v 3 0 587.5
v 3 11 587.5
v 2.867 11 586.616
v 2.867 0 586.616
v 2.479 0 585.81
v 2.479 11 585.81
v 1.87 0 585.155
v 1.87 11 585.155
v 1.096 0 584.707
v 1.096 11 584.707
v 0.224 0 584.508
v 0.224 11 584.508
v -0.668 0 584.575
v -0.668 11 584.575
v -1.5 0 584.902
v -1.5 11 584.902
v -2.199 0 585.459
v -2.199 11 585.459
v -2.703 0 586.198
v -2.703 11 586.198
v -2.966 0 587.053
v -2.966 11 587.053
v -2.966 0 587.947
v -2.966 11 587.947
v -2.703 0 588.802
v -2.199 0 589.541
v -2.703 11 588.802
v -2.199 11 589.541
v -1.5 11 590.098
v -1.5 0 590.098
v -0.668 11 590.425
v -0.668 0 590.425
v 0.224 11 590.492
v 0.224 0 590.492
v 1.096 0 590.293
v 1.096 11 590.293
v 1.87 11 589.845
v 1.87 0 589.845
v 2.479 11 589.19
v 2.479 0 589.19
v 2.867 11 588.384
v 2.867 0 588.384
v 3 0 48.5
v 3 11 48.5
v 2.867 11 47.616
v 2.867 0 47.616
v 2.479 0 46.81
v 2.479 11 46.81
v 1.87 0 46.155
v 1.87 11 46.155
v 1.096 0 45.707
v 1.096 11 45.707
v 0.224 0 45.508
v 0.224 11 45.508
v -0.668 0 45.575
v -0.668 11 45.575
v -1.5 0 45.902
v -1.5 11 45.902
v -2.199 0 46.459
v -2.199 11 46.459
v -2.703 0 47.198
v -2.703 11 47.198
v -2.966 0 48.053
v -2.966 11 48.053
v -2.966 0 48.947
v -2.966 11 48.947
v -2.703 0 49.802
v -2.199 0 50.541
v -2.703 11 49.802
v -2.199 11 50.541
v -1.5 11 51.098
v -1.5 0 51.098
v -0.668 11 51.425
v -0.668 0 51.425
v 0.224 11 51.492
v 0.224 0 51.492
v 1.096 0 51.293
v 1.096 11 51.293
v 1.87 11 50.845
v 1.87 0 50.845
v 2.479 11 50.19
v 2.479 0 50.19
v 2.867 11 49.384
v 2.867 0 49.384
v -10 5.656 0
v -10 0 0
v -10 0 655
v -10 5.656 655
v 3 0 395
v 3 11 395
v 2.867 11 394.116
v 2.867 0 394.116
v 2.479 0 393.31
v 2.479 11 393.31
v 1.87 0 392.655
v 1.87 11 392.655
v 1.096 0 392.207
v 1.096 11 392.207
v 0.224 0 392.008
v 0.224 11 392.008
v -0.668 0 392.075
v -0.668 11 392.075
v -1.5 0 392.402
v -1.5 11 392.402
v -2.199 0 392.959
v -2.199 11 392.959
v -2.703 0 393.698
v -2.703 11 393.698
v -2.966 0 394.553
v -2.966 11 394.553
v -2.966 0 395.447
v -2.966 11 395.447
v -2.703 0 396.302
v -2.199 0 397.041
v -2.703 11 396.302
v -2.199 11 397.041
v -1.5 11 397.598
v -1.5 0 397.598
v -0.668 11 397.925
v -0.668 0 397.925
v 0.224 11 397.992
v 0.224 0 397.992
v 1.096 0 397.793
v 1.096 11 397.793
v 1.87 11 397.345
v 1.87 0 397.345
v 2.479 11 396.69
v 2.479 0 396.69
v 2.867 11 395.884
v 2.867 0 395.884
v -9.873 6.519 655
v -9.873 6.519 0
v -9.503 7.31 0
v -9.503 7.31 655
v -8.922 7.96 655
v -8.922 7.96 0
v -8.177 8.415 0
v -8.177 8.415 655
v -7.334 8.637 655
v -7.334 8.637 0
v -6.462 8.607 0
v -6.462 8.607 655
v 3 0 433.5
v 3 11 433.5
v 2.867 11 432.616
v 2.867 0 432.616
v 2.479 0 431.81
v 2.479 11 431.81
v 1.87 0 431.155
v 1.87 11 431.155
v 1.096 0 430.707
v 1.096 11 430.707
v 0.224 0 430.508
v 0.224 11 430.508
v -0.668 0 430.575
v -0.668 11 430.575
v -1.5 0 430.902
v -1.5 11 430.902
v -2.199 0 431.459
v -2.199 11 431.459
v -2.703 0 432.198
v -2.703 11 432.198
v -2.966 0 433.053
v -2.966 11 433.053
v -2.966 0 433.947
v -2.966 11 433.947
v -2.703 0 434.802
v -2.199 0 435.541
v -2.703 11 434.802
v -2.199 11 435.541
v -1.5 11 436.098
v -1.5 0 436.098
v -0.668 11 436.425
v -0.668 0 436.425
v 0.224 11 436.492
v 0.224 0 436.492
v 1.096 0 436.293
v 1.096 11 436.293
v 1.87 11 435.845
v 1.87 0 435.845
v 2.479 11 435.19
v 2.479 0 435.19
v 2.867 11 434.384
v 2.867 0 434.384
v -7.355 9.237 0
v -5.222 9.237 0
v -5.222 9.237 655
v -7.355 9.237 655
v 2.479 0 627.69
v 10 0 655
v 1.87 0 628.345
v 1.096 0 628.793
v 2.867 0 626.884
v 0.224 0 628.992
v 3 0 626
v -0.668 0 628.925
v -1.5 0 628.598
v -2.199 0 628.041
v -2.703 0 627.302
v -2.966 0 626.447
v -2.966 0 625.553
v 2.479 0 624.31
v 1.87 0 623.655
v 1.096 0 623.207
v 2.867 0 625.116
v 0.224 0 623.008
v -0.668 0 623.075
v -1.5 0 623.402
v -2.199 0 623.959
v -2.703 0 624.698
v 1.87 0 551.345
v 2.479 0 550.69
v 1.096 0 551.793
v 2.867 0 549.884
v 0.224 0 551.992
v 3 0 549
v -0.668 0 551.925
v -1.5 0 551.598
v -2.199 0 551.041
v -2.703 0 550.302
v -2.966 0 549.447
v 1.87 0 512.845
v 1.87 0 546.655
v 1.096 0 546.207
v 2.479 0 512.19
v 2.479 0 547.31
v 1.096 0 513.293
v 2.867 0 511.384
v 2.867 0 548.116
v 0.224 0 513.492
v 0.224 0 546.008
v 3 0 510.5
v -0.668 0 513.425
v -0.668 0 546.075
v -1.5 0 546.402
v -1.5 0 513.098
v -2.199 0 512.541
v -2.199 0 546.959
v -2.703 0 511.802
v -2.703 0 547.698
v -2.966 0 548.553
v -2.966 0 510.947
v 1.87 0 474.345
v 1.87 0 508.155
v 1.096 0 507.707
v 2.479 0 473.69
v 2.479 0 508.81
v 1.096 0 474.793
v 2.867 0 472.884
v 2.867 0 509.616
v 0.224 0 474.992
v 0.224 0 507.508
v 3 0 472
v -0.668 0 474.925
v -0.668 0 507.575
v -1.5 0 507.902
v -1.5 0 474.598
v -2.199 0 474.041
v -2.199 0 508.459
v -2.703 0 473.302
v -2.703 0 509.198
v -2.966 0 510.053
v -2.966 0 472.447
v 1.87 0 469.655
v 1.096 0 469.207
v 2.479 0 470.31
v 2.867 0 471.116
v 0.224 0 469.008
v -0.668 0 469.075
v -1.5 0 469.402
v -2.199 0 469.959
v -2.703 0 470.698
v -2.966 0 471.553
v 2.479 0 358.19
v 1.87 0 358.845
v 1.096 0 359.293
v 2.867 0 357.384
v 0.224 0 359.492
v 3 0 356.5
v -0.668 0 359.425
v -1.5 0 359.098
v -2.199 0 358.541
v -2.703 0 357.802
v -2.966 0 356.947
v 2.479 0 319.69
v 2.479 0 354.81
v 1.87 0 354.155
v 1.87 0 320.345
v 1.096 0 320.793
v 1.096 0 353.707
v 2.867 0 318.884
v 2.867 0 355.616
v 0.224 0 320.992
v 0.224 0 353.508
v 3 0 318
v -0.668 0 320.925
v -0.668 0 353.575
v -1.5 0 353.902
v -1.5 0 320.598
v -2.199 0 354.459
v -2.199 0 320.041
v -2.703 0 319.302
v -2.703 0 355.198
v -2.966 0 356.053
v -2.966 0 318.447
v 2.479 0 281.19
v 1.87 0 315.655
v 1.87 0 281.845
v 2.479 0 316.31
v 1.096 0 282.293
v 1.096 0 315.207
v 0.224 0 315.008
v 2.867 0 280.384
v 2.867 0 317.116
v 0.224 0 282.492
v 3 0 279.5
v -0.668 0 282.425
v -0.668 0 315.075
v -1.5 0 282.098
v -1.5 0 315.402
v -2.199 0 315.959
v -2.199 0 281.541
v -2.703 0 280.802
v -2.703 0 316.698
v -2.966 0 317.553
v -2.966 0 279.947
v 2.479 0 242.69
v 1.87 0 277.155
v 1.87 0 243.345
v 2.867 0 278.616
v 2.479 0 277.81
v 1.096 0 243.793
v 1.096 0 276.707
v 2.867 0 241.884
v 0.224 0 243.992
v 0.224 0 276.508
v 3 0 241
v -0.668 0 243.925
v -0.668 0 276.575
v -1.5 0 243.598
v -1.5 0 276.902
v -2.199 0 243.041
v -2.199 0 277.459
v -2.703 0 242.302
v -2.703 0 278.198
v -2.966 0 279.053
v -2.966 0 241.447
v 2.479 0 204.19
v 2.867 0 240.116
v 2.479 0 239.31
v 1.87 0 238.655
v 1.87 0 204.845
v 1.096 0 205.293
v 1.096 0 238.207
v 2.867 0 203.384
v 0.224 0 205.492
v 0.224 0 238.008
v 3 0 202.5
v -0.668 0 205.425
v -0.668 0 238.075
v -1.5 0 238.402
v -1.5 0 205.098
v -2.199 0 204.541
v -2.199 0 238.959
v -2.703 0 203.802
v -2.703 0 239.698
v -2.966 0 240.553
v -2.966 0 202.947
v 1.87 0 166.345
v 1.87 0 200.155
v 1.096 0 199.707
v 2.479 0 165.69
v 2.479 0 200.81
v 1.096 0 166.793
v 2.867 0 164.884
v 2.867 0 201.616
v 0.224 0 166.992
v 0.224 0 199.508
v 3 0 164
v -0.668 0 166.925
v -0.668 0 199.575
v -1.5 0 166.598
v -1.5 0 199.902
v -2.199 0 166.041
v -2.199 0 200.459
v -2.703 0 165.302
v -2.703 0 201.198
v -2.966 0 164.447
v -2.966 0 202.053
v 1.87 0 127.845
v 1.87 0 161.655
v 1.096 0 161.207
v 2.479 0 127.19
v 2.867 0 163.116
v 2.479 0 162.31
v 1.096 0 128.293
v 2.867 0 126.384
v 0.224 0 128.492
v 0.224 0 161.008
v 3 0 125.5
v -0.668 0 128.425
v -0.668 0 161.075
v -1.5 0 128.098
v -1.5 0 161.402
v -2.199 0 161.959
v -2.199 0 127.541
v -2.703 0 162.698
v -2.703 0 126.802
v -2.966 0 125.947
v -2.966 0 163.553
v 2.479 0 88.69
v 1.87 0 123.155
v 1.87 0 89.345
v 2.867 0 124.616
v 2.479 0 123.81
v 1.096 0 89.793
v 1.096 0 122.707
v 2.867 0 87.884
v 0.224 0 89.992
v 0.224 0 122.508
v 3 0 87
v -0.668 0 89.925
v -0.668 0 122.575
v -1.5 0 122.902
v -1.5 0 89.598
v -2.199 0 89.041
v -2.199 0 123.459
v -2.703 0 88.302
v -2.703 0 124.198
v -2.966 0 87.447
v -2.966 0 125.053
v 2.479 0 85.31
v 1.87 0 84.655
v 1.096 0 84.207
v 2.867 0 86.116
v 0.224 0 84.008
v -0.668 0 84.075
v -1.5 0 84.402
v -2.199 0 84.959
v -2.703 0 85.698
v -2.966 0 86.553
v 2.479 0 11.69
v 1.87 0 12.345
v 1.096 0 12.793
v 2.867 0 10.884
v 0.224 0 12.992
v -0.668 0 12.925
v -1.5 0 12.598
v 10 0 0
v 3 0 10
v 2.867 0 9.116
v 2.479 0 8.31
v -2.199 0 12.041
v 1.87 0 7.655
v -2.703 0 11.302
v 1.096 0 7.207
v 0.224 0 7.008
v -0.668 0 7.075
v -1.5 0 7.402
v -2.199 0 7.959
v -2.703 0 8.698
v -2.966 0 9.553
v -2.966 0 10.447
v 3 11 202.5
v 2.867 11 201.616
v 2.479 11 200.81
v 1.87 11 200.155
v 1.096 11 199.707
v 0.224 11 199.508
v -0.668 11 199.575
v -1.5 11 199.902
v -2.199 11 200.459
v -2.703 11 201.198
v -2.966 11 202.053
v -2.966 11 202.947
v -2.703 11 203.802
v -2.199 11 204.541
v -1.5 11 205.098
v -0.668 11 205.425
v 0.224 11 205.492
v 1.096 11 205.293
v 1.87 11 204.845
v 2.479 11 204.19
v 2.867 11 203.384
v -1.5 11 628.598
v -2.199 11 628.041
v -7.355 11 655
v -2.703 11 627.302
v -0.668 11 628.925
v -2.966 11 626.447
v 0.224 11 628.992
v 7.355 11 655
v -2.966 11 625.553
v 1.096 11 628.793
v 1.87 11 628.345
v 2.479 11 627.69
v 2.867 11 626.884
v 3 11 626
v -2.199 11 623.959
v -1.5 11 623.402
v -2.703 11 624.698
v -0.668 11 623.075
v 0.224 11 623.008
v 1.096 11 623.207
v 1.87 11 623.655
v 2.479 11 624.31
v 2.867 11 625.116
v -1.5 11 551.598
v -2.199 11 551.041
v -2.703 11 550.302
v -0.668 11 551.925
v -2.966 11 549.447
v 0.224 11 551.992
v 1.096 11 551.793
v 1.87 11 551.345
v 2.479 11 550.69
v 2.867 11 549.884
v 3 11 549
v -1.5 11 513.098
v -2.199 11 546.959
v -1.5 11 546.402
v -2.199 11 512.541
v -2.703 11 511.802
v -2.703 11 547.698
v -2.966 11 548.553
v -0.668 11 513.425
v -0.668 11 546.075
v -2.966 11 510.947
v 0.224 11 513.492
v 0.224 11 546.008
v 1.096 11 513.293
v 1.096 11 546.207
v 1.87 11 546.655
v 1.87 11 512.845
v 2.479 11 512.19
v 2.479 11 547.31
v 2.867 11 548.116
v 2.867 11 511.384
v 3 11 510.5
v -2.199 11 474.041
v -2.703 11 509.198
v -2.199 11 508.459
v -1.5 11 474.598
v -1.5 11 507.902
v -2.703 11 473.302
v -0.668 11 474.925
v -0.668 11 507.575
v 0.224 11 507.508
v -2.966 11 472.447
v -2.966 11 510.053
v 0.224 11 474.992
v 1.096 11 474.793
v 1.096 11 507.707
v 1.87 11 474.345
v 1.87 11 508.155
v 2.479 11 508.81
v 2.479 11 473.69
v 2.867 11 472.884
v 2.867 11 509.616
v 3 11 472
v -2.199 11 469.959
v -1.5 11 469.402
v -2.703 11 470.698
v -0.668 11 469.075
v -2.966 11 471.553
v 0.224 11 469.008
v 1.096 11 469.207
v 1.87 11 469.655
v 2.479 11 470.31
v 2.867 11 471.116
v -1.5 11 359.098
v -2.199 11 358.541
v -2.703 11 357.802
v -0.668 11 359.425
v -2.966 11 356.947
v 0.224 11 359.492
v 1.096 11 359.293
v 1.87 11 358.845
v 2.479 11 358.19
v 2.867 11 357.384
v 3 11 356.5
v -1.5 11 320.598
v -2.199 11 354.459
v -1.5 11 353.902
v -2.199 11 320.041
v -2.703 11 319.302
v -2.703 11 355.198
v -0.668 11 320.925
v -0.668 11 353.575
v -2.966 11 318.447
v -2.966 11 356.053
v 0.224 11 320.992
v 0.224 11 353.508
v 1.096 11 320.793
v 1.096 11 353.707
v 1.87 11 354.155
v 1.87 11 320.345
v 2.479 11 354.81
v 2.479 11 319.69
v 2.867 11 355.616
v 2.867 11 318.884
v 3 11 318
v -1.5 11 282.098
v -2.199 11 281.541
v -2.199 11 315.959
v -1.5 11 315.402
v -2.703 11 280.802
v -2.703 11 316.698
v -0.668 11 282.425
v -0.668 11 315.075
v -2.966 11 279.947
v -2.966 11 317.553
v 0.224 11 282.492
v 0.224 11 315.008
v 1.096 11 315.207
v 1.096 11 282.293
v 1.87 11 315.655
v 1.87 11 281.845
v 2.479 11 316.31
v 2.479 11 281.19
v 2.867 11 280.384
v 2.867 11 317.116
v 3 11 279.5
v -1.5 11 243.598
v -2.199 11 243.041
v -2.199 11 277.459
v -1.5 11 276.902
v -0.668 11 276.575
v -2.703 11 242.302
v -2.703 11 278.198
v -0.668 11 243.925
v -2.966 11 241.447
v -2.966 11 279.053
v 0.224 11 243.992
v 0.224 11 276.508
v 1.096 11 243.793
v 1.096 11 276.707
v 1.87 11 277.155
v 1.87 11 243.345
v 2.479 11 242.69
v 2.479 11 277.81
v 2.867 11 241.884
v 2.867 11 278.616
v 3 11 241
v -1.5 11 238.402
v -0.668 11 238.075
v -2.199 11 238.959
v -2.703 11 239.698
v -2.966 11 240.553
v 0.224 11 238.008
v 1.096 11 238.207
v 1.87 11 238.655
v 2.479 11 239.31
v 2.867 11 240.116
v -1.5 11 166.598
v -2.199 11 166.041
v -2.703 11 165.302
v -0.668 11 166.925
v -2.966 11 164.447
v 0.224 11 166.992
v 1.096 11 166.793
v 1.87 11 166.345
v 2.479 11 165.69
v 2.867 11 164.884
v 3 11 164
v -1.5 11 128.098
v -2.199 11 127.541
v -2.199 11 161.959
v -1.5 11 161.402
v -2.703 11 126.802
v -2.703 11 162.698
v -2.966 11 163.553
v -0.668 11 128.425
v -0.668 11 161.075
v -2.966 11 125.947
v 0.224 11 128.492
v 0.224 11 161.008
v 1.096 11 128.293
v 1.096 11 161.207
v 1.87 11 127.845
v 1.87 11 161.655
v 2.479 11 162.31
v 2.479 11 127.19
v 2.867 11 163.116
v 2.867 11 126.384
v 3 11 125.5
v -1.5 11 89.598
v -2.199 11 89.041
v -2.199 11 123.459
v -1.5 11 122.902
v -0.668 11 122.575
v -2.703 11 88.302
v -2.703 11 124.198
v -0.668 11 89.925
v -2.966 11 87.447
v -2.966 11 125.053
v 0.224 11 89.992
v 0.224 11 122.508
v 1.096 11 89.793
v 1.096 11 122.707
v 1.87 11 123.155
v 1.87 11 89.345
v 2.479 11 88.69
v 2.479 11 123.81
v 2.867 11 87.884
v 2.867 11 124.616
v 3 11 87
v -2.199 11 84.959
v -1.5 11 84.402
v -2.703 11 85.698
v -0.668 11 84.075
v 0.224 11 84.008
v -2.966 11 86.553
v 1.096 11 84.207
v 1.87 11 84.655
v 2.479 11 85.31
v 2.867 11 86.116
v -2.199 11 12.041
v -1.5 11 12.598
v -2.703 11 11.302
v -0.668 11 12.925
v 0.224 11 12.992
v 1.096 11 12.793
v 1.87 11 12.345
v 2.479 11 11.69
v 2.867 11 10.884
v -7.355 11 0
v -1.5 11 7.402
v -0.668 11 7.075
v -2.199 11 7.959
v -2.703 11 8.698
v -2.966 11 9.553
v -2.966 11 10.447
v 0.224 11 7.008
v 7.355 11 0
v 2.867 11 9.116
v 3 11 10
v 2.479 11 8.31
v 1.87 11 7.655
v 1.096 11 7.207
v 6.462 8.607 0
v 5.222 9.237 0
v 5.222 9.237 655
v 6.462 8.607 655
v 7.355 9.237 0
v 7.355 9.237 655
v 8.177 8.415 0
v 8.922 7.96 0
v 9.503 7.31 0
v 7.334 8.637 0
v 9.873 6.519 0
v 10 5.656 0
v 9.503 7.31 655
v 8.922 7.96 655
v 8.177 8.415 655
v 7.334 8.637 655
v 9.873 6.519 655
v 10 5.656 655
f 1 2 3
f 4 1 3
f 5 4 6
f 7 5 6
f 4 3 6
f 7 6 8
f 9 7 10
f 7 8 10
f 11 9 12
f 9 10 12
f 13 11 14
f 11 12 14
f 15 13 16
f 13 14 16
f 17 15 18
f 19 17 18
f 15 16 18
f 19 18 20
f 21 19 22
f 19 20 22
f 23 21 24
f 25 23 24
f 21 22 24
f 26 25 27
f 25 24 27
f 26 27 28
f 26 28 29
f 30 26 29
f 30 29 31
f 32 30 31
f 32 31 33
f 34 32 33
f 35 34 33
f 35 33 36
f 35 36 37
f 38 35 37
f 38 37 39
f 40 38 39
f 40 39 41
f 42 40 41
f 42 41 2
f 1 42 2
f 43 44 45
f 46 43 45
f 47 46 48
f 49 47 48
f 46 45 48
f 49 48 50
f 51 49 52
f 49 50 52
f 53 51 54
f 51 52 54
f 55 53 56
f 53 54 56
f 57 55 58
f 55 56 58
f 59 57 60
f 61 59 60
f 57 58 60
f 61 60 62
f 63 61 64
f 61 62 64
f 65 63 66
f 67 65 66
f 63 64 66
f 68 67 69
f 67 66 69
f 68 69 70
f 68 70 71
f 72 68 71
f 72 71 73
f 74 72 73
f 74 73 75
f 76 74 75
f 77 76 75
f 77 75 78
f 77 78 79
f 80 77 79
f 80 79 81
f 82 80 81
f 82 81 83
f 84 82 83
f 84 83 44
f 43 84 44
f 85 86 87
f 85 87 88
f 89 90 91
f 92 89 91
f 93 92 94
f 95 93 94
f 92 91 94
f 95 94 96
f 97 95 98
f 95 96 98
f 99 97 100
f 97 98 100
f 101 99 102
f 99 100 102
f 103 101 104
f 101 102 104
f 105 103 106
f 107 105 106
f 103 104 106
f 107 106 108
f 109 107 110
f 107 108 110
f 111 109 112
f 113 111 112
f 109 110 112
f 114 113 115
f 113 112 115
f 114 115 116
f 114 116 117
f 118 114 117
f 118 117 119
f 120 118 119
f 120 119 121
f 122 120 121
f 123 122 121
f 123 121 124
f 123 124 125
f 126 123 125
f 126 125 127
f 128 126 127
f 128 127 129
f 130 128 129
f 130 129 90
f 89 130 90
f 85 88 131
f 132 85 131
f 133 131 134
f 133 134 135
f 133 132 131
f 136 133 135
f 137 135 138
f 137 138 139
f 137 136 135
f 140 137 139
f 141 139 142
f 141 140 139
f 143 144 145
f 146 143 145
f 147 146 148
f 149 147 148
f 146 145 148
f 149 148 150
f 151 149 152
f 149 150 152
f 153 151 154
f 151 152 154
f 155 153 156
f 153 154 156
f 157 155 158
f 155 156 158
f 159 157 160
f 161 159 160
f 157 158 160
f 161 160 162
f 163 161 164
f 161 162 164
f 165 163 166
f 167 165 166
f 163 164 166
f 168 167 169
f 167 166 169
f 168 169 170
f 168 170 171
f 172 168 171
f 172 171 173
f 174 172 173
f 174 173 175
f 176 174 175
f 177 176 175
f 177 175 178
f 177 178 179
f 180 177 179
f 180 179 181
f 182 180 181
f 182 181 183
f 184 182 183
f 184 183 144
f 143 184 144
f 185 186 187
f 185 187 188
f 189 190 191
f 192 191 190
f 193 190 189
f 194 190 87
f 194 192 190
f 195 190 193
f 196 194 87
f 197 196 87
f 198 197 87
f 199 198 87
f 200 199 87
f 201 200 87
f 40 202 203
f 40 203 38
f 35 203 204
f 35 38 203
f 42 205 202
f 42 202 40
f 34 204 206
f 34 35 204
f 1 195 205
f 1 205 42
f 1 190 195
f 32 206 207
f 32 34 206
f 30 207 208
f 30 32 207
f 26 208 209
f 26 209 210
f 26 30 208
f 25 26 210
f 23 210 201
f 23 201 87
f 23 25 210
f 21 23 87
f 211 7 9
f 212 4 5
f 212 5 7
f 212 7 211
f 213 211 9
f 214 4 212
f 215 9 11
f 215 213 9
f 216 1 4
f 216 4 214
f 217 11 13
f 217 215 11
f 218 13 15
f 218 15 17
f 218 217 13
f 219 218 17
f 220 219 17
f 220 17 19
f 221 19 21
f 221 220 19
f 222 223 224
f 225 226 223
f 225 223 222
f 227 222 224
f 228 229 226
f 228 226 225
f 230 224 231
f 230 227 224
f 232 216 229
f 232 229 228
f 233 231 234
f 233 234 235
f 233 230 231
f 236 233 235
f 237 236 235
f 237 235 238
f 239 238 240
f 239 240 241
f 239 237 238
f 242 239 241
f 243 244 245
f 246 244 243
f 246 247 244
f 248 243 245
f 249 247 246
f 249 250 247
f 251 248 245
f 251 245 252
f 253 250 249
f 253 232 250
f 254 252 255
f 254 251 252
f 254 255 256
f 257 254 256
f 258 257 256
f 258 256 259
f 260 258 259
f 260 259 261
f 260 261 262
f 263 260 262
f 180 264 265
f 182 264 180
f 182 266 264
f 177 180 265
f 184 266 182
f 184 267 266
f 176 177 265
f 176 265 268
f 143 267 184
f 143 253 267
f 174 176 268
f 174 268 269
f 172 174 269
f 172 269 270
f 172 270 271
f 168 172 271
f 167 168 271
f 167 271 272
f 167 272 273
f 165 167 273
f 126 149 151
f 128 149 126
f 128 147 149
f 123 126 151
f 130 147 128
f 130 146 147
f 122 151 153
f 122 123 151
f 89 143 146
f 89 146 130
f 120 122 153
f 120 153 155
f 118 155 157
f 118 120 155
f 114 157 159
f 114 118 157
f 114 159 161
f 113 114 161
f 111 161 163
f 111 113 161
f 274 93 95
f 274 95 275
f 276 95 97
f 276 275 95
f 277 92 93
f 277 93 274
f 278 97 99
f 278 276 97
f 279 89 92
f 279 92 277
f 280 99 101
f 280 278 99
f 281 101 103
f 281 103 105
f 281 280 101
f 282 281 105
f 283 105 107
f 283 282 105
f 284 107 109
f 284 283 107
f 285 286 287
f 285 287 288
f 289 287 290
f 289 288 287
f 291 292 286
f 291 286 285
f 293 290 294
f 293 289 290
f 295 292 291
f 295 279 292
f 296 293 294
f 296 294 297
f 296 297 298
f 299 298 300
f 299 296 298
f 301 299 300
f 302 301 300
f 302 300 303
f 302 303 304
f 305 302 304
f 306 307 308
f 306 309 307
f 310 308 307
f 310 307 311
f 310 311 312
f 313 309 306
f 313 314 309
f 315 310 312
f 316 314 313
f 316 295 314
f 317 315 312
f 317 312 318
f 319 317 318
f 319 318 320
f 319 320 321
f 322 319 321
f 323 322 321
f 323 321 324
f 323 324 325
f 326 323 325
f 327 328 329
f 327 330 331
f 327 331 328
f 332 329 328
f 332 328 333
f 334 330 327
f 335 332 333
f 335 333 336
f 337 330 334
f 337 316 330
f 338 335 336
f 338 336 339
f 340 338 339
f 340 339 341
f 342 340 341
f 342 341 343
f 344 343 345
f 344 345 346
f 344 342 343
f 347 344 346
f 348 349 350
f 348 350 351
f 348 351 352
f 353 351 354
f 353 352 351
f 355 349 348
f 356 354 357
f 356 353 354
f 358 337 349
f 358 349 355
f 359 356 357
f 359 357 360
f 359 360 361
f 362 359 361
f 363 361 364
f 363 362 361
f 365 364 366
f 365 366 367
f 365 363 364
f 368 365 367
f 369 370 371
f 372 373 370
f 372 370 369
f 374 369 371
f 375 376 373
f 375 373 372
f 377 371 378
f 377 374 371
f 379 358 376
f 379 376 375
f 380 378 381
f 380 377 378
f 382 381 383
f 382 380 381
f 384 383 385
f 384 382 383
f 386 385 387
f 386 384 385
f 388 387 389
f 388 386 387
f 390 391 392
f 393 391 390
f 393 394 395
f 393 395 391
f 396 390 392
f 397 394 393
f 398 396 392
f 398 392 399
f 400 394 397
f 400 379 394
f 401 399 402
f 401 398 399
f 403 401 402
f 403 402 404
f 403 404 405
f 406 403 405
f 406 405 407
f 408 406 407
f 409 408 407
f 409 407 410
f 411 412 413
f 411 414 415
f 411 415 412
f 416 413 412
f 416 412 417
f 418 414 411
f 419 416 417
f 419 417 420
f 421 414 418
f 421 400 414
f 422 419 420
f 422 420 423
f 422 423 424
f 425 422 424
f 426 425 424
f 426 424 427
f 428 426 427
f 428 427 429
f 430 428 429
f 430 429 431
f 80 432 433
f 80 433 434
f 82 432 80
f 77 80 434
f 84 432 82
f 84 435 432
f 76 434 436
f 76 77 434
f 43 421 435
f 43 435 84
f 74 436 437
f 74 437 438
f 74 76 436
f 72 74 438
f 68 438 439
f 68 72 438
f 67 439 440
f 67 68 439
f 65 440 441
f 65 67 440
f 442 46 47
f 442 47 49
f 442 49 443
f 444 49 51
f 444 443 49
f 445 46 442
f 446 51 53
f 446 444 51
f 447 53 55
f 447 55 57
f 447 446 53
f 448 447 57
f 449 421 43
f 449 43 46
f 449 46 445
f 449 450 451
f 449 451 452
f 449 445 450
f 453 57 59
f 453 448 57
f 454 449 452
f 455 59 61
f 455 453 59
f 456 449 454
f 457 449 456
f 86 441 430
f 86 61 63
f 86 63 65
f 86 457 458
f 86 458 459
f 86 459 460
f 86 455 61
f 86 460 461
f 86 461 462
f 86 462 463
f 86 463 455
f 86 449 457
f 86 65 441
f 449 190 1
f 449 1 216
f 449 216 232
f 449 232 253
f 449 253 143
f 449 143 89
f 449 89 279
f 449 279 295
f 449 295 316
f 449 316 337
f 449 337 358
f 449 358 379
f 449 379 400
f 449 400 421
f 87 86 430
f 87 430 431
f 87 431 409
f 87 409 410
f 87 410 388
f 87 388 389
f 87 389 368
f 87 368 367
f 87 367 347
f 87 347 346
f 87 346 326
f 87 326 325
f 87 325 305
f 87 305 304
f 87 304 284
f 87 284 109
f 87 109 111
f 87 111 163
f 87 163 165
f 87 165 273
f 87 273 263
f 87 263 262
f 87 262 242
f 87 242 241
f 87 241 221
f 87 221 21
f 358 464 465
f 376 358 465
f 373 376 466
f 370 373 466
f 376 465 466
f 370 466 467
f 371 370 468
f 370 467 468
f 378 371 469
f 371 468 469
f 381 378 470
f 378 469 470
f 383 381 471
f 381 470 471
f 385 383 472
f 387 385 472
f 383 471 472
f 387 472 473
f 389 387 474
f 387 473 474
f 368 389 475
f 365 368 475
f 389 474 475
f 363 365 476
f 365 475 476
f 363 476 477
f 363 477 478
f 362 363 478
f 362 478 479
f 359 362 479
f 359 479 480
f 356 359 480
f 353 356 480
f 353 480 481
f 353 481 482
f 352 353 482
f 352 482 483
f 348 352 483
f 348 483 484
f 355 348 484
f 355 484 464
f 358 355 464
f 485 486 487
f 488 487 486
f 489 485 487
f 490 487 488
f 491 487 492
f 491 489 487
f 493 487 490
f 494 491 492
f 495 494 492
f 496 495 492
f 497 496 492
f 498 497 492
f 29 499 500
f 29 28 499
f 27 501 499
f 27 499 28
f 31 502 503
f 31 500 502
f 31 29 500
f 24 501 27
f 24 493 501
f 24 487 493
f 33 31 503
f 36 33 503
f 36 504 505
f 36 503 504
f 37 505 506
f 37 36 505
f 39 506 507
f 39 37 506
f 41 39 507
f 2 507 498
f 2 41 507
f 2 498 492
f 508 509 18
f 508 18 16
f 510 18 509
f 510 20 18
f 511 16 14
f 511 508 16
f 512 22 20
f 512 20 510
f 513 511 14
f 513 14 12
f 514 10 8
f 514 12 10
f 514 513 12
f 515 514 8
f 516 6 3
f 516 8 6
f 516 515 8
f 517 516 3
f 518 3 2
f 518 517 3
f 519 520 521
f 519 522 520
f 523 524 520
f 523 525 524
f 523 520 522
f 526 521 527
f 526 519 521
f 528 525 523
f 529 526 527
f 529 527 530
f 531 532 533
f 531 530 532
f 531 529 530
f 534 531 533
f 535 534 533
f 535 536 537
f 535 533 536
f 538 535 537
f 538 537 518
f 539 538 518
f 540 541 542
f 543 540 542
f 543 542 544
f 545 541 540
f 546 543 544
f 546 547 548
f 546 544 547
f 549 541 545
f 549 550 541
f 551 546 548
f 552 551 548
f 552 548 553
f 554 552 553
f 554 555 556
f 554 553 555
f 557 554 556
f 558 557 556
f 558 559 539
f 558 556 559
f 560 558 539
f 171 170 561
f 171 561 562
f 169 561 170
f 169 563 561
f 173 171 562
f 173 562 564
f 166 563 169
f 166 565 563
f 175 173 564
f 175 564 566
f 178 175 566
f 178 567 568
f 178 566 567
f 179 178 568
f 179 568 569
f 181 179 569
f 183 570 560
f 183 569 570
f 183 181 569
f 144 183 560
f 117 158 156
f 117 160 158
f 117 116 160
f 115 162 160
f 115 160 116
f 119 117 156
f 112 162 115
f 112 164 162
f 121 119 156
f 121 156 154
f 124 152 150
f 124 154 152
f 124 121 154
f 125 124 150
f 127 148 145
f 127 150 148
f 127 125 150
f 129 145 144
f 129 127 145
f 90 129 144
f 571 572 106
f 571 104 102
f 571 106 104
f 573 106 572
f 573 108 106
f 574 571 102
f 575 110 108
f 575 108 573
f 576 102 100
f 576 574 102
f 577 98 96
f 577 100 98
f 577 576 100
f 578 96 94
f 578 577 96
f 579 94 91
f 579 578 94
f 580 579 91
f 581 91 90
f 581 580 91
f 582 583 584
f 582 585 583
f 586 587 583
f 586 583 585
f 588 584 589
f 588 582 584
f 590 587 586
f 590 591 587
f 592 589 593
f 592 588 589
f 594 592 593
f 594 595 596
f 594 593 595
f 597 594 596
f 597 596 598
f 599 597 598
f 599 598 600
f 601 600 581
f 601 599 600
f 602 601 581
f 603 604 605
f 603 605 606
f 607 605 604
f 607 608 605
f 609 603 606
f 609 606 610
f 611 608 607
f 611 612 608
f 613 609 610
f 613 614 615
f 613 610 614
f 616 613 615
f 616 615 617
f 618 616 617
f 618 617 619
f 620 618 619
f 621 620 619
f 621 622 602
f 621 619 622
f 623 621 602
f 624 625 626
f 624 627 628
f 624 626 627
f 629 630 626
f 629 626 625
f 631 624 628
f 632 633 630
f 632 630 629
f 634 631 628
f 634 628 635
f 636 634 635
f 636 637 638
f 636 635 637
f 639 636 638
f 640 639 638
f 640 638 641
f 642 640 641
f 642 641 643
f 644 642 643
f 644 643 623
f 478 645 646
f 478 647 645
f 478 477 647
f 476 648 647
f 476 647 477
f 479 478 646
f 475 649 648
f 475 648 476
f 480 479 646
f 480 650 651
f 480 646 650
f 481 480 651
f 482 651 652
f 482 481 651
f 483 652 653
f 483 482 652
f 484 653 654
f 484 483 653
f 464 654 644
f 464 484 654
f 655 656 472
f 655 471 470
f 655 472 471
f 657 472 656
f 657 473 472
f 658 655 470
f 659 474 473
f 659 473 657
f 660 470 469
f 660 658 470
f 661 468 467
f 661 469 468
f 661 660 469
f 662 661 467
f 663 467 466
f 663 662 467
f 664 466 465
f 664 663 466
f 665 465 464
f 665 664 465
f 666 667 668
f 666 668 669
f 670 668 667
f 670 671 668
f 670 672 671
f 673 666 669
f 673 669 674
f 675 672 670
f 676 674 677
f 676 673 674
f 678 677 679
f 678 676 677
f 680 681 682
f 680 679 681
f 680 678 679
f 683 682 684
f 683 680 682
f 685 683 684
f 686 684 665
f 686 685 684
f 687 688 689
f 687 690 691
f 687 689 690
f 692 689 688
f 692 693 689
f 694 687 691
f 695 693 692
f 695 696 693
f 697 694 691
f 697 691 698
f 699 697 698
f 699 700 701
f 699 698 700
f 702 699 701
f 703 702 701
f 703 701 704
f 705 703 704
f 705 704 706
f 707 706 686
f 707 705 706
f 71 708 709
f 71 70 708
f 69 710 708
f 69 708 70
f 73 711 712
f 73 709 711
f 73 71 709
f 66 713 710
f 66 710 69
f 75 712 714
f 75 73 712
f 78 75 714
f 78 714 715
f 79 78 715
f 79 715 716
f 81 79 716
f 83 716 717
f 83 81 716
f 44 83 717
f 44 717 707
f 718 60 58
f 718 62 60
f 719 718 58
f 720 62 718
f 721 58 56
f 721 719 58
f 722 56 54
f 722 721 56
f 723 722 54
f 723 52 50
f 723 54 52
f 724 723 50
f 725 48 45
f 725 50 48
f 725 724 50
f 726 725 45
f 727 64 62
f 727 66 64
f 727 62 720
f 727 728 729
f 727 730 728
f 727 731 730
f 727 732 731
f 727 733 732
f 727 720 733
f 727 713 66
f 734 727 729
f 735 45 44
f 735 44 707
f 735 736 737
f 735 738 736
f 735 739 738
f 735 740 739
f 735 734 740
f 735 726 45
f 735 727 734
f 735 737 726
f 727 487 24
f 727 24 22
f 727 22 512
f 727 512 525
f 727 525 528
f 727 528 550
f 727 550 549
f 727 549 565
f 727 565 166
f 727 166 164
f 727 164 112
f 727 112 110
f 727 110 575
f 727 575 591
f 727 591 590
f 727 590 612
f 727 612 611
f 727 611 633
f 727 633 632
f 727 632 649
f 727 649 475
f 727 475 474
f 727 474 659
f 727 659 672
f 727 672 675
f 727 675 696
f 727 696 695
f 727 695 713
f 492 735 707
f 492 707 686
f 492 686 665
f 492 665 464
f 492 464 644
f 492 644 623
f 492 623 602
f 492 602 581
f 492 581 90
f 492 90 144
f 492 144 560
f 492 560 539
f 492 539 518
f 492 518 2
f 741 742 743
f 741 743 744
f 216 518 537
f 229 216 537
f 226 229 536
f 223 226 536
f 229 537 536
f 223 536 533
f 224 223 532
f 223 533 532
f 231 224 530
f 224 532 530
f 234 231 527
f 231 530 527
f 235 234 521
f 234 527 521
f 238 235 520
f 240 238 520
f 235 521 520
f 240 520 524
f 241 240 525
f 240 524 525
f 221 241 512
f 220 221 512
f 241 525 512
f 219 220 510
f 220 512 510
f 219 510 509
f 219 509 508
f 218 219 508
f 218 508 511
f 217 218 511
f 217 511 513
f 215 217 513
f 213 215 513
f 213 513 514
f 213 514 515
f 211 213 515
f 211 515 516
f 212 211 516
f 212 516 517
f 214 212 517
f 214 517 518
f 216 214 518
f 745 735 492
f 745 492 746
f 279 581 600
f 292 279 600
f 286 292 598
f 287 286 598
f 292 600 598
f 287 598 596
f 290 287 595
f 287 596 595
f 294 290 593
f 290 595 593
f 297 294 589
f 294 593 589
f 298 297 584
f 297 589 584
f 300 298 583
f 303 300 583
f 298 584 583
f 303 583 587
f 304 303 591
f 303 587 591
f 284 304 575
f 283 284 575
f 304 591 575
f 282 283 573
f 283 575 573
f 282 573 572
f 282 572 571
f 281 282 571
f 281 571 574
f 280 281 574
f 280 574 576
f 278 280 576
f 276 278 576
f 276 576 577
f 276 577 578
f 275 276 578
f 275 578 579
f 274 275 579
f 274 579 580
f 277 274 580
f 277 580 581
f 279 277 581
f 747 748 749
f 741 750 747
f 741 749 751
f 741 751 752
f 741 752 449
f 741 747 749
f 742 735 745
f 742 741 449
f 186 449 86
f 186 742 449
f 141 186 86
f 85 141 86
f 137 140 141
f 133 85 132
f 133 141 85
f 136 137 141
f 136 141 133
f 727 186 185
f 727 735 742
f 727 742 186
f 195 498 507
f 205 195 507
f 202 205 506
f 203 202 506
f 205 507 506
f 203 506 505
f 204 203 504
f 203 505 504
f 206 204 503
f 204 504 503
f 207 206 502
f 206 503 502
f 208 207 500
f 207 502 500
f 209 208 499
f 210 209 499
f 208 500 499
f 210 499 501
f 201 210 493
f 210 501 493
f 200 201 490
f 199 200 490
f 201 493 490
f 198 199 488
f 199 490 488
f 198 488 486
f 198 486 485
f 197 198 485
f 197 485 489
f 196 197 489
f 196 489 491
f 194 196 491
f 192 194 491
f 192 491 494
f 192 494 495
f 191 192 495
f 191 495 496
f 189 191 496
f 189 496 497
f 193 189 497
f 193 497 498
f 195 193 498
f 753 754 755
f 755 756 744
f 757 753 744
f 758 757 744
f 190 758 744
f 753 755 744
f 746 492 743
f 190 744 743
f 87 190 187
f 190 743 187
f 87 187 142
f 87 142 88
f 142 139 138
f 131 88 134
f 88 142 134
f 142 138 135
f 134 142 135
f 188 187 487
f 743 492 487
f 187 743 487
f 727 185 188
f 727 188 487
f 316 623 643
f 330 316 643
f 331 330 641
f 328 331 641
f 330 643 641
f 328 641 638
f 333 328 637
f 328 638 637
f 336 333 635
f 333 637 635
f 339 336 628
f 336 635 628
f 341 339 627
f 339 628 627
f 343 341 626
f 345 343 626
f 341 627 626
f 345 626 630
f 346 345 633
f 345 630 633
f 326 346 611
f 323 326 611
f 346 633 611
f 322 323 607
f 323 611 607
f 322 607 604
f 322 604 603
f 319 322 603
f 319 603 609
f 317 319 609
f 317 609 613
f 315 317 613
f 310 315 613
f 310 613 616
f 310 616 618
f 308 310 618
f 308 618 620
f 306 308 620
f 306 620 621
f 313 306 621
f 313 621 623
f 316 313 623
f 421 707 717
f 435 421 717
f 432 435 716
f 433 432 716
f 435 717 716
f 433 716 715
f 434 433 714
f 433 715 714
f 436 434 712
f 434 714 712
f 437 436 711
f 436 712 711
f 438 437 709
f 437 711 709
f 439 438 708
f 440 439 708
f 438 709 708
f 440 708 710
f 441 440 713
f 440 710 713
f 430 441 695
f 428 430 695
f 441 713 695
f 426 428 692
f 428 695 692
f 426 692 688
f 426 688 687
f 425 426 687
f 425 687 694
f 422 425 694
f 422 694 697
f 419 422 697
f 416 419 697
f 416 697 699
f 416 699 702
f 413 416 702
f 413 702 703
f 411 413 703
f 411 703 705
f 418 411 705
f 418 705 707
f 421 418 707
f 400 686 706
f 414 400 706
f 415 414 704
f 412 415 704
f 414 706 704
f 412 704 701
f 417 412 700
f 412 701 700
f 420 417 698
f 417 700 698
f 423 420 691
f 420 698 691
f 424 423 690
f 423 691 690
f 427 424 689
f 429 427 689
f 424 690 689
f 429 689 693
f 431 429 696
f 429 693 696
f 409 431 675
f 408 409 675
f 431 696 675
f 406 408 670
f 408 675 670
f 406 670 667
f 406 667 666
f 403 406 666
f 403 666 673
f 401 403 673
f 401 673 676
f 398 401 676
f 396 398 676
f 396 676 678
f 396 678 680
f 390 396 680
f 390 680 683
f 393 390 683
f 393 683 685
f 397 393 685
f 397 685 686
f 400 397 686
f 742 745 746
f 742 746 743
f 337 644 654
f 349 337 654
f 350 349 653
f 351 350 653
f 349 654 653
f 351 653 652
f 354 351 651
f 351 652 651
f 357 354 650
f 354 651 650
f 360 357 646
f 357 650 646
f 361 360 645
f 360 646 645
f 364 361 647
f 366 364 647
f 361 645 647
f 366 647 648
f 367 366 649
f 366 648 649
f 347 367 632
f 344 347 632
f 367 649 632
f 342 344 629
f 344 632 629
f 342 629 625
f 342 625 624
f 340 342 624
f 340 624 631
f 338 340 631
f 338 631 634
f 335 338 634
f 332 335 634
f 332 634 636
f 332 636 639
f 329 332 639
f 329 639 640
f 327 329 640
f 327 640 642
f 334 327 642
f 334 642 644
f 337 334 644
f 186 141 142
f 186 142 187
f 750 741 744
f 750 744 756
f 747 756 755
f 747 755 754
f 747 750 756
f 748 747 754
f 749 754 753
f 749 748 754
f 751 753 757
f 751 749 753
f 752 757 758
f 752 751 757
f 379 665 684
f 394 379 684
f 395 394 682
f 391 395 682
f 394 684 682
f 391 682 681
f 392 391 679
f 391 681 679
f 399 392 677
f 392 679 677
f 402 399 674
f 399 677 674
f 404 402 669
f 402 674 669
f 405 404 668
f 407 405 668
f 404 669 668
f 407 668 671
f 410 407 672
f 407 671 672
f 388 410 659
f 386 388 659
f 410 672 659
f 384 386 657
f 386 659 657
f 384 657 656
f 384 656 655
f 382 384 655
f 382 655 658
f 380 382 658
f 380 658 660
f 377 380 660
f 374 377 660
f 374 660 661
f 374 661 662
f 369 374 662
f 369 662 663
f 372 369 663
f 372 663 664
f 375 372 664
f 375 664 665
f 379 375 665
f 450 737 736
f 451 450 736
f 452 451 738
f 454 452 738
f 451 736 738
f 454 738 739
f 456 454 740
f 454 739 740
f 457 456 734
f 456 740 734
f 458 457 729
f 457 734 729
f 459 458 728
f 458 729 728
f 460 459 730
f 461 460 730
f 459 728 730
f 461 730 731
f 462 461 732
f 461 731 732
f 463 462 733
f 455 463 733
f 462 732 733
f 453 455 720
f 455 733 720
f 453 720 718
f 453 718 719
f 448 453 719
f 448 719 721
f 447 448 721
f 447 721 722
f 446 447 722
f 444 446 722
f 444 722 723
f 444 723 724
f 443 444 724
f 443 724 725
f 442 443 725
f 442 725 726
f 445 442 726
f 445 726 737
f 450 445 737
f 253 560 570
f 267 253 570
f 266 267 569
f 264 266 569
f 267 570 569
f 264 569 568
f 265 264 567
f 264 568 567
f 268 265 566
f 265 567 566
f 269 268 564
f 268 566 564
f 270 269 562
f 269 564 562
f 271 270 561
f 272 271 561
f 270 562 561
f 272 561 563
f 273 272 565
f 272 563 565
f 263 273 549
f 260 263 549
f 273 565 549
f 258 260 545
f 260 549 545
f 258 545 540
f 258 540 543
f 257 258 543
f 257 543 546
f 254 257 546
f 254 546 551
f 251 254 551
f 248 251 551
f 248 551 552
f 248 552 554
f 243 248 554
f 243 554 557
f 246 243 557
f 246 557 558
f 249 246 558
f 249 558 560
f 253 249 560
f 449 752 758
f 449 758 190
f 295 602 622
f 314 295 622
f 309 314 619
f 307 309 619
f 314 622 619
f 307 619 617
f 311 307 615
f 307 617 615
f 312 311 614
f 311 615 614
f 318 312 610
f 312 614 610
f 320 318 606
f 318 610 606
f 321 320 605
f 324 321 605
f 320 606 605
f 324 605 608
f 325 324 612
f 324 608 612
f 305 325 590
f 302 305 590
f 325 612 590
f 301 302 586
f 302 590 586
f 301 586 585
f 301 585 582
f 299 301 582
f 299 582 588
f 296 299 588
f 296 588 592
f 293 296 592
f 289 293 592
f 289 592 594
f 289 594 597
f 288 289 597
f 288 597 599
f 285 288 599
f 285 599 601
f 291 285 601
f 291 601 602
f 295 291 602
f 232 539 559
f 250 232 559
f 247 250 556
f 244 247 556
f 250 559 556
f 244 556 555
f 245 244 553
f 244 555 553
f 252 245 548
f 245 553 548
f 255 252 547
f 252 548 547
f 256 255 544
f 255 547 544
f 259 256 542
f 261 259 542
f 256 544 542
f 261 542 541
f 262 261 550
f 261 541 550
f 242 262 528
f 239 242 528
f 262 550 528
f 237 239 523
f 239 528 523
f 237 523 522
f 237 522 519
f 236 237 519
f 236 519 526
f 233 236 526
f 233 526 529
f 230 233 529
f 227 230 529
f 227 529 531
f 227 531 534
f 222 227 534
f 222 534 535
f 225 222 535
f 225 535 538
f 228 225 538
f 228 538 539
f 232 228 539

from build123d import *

# Parameters (mm, degrees)
SALIENTE_EXTRUIR1_DEPTH = 655
CROQUIS2_R              = 3
CORTAR_EXTRUIR1_DEPTH   = 12


with BuildPart() as part:
    # Croquis1 → Saliente-Extruir1 (new body)
    with BuildSketch(Plane.XY):
        with BuildLine():
            Line((-10, 0), (-10, 5.656056356))
            ThreePointArc((-10, 5.656056356), (-8.921539569, 7.959897862), (-6.461542876, 8.607338099))
            Line((-6.461542876, 8.607338099), (-5.221744043, 9.236902282))
            Line((-5.221744043, 9.236902282), (-7.354818693, 9.236902282))
            Line((-7.354818693, 9.236902282), (-7.354818693, 11))
            Line((-7.354818693, 11), (7.354818693, 11))
            Line((7.354818693, 11), (7.354818693, 9.236902282))
            Line((7.354818693, 9.236902282), (5.221744043, 9.236902282))
            Line((5.221744043, 9.236902282), (6.461542876, 8.607338099))
            ThreePointArc((6.461542876, 8.607338099), (8.921539569, 7.959897862), (10, 5.656056356))
            Line((10, 5.656056356), (10, 0))
            Line((10, 0), (0, 0))
            Line((0, 0), (-10, 0))
        make_face()
    extrude(amount=SALIENTE_EXTRUIR1_DEPTH)

    # Croquis2 → Cortar-Extruir1 (cut)
    with BuildSketch(Plane(origin=(0, 11, 0), x_dir=(1, 0, 0), z_dir=(0, 1, 0))):
        with Locations((0, -10)):
            Circle(CROQUIS2_R)
        with Locations((0, -48.5)):
            Circle(CROQUIS2_R)
        with Locations((0, -87)):
            Circle(CROQUIS2_R)
        with Locations((0, -125.5)):
            Circle(CROQUIS2_R)
        with Locations((0, -164)):
            Circle(CROQUIS2_R)
        with Locations((0, -202.5)):
            Circle(CROQUIS2_R)
        with Locations((0, -241)):
            Circle(CROQUIS2_R)
        with Locations((0, -279.5)):
            Circle(CROQUIS2_R)
        with Locations((0, -318)):
            Circle(CROQUIS2_R)
        with Locations((0, -356.5)):
            Circle(CROQUIS2_R)
        with Locations((0, -395)):
            Circle(CROQUIS2_R)
        with Locations((0, -433.5)):
            Circle(CROQUIS2_R)
        with Locations((0, -472)):
            Circle(CROQUIS2_R)
        with Locations((0, -510.5)):
            Circle(CROQUIS2_R)
        with Locations((0, -549)):
            Circle(CROQUIS2_R)
        with Locations((0, -587.5)):
            Circle(CROQUIS2_R)
        with Locations((0, -626)):
            Circle(CROQUIS2_R)
    extrude(amount=-CORTAR_EXTRUIR1_DEPTH, mode=Mode.SUBTRACT)


solid = part.part
